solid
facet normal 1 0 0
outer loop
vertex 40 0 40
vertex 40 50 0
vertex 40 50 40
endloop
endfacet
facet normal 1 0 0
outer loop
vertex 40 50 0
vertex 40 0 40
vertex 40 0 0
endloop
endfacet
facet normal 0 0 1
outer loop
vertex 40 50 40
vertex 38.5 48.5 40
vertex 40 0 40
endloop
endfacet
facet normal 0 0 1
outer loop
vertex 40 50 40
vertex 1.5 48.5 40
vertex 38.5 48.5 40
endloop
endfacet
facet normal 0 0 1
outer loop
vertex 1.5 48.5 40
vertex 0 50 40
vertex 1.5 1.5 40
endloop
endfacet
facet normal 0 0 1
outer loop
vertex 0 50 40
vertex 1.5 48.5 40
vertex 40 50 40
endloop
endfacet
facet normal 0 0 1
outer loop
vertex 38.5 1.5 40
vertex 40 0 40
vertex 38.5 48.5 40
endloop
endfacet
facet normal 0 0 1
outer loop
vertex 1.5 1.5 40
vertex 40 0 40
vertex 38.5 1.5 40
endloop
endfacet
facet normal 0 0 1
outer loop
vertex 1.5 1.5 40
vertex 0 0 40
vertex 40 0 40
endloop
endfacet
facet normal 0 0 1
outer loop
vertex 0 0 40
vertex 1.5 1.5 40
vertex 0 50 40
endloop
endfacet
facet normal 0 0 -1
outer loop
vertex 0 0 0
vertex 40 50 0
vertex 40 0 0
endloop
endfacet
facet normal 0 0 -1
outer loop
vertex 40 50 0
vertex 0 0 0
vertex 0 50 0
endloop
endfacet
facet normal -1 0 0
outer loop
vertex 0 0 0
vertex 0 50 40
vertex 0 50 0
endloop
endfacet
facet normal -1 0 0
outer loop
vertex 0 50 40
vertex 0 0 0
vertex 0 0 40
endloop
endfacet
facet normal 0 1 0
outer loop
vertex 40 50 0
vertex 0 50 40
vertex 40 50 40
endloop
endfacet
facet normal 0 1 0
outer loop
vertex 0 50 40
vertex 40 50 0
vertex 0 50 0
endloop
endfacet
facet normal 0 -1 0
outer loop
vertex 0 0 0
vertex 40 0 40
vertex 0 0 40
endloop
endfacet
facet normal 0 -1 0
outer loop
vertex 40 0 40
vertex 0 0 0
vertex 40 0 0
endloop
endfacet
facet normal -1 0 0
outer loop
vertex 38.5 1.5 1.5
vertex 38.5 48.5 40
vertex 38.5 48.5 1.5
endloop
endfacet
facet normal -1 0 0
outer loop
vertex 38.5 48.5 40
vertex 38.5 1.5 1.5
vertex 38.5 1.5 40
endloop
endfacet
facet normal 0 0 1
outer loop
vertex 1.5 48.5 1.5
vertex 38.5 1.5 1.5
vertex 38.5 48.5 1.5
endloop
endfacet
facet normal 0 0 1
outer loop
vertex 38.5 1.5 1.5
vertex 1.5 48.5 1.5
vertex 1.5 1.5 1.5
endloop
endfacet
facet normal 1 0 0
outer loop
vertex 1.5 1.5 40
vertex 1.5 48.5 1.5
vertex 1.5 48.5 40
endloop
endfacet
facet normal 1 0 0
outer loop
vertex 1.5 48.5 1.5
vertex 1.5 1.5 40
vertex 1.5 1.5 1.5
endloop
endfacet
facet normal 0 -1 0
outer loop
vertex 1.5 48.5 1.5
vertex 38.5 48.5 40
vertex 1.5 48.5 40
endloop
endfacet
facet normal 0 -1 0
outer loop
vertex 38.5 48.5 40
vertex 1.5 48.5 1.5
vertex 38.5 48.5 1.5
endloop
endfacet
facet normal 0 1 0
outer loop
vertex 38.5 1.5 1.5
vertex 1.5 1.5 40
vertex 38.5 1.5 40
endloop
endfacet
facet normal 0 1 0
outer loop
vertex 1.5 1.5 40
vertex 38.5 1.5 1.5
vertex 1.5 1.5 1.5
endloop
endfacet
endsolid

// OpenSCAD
$fn = 32;

// ----------------------------------------------------------------------
// Open box: 1.5 mm walls
// ----------------------------------------------------------------------

// --- parameters (mm) ---
box_l = 40;               // outer length, X
box_w = 50;               // outer width, Y
box_h = 40;               // outer height, Z
wall = 1.5;               // wall thickness
floor = 1.5;              // floor thickness

difference() {
  cube([box_l, box_w, box_h]);
  translate([wall, wall, floor])
    cube([box_l - 2 * wall, box_w - 2 * wall, box_h]);
}
